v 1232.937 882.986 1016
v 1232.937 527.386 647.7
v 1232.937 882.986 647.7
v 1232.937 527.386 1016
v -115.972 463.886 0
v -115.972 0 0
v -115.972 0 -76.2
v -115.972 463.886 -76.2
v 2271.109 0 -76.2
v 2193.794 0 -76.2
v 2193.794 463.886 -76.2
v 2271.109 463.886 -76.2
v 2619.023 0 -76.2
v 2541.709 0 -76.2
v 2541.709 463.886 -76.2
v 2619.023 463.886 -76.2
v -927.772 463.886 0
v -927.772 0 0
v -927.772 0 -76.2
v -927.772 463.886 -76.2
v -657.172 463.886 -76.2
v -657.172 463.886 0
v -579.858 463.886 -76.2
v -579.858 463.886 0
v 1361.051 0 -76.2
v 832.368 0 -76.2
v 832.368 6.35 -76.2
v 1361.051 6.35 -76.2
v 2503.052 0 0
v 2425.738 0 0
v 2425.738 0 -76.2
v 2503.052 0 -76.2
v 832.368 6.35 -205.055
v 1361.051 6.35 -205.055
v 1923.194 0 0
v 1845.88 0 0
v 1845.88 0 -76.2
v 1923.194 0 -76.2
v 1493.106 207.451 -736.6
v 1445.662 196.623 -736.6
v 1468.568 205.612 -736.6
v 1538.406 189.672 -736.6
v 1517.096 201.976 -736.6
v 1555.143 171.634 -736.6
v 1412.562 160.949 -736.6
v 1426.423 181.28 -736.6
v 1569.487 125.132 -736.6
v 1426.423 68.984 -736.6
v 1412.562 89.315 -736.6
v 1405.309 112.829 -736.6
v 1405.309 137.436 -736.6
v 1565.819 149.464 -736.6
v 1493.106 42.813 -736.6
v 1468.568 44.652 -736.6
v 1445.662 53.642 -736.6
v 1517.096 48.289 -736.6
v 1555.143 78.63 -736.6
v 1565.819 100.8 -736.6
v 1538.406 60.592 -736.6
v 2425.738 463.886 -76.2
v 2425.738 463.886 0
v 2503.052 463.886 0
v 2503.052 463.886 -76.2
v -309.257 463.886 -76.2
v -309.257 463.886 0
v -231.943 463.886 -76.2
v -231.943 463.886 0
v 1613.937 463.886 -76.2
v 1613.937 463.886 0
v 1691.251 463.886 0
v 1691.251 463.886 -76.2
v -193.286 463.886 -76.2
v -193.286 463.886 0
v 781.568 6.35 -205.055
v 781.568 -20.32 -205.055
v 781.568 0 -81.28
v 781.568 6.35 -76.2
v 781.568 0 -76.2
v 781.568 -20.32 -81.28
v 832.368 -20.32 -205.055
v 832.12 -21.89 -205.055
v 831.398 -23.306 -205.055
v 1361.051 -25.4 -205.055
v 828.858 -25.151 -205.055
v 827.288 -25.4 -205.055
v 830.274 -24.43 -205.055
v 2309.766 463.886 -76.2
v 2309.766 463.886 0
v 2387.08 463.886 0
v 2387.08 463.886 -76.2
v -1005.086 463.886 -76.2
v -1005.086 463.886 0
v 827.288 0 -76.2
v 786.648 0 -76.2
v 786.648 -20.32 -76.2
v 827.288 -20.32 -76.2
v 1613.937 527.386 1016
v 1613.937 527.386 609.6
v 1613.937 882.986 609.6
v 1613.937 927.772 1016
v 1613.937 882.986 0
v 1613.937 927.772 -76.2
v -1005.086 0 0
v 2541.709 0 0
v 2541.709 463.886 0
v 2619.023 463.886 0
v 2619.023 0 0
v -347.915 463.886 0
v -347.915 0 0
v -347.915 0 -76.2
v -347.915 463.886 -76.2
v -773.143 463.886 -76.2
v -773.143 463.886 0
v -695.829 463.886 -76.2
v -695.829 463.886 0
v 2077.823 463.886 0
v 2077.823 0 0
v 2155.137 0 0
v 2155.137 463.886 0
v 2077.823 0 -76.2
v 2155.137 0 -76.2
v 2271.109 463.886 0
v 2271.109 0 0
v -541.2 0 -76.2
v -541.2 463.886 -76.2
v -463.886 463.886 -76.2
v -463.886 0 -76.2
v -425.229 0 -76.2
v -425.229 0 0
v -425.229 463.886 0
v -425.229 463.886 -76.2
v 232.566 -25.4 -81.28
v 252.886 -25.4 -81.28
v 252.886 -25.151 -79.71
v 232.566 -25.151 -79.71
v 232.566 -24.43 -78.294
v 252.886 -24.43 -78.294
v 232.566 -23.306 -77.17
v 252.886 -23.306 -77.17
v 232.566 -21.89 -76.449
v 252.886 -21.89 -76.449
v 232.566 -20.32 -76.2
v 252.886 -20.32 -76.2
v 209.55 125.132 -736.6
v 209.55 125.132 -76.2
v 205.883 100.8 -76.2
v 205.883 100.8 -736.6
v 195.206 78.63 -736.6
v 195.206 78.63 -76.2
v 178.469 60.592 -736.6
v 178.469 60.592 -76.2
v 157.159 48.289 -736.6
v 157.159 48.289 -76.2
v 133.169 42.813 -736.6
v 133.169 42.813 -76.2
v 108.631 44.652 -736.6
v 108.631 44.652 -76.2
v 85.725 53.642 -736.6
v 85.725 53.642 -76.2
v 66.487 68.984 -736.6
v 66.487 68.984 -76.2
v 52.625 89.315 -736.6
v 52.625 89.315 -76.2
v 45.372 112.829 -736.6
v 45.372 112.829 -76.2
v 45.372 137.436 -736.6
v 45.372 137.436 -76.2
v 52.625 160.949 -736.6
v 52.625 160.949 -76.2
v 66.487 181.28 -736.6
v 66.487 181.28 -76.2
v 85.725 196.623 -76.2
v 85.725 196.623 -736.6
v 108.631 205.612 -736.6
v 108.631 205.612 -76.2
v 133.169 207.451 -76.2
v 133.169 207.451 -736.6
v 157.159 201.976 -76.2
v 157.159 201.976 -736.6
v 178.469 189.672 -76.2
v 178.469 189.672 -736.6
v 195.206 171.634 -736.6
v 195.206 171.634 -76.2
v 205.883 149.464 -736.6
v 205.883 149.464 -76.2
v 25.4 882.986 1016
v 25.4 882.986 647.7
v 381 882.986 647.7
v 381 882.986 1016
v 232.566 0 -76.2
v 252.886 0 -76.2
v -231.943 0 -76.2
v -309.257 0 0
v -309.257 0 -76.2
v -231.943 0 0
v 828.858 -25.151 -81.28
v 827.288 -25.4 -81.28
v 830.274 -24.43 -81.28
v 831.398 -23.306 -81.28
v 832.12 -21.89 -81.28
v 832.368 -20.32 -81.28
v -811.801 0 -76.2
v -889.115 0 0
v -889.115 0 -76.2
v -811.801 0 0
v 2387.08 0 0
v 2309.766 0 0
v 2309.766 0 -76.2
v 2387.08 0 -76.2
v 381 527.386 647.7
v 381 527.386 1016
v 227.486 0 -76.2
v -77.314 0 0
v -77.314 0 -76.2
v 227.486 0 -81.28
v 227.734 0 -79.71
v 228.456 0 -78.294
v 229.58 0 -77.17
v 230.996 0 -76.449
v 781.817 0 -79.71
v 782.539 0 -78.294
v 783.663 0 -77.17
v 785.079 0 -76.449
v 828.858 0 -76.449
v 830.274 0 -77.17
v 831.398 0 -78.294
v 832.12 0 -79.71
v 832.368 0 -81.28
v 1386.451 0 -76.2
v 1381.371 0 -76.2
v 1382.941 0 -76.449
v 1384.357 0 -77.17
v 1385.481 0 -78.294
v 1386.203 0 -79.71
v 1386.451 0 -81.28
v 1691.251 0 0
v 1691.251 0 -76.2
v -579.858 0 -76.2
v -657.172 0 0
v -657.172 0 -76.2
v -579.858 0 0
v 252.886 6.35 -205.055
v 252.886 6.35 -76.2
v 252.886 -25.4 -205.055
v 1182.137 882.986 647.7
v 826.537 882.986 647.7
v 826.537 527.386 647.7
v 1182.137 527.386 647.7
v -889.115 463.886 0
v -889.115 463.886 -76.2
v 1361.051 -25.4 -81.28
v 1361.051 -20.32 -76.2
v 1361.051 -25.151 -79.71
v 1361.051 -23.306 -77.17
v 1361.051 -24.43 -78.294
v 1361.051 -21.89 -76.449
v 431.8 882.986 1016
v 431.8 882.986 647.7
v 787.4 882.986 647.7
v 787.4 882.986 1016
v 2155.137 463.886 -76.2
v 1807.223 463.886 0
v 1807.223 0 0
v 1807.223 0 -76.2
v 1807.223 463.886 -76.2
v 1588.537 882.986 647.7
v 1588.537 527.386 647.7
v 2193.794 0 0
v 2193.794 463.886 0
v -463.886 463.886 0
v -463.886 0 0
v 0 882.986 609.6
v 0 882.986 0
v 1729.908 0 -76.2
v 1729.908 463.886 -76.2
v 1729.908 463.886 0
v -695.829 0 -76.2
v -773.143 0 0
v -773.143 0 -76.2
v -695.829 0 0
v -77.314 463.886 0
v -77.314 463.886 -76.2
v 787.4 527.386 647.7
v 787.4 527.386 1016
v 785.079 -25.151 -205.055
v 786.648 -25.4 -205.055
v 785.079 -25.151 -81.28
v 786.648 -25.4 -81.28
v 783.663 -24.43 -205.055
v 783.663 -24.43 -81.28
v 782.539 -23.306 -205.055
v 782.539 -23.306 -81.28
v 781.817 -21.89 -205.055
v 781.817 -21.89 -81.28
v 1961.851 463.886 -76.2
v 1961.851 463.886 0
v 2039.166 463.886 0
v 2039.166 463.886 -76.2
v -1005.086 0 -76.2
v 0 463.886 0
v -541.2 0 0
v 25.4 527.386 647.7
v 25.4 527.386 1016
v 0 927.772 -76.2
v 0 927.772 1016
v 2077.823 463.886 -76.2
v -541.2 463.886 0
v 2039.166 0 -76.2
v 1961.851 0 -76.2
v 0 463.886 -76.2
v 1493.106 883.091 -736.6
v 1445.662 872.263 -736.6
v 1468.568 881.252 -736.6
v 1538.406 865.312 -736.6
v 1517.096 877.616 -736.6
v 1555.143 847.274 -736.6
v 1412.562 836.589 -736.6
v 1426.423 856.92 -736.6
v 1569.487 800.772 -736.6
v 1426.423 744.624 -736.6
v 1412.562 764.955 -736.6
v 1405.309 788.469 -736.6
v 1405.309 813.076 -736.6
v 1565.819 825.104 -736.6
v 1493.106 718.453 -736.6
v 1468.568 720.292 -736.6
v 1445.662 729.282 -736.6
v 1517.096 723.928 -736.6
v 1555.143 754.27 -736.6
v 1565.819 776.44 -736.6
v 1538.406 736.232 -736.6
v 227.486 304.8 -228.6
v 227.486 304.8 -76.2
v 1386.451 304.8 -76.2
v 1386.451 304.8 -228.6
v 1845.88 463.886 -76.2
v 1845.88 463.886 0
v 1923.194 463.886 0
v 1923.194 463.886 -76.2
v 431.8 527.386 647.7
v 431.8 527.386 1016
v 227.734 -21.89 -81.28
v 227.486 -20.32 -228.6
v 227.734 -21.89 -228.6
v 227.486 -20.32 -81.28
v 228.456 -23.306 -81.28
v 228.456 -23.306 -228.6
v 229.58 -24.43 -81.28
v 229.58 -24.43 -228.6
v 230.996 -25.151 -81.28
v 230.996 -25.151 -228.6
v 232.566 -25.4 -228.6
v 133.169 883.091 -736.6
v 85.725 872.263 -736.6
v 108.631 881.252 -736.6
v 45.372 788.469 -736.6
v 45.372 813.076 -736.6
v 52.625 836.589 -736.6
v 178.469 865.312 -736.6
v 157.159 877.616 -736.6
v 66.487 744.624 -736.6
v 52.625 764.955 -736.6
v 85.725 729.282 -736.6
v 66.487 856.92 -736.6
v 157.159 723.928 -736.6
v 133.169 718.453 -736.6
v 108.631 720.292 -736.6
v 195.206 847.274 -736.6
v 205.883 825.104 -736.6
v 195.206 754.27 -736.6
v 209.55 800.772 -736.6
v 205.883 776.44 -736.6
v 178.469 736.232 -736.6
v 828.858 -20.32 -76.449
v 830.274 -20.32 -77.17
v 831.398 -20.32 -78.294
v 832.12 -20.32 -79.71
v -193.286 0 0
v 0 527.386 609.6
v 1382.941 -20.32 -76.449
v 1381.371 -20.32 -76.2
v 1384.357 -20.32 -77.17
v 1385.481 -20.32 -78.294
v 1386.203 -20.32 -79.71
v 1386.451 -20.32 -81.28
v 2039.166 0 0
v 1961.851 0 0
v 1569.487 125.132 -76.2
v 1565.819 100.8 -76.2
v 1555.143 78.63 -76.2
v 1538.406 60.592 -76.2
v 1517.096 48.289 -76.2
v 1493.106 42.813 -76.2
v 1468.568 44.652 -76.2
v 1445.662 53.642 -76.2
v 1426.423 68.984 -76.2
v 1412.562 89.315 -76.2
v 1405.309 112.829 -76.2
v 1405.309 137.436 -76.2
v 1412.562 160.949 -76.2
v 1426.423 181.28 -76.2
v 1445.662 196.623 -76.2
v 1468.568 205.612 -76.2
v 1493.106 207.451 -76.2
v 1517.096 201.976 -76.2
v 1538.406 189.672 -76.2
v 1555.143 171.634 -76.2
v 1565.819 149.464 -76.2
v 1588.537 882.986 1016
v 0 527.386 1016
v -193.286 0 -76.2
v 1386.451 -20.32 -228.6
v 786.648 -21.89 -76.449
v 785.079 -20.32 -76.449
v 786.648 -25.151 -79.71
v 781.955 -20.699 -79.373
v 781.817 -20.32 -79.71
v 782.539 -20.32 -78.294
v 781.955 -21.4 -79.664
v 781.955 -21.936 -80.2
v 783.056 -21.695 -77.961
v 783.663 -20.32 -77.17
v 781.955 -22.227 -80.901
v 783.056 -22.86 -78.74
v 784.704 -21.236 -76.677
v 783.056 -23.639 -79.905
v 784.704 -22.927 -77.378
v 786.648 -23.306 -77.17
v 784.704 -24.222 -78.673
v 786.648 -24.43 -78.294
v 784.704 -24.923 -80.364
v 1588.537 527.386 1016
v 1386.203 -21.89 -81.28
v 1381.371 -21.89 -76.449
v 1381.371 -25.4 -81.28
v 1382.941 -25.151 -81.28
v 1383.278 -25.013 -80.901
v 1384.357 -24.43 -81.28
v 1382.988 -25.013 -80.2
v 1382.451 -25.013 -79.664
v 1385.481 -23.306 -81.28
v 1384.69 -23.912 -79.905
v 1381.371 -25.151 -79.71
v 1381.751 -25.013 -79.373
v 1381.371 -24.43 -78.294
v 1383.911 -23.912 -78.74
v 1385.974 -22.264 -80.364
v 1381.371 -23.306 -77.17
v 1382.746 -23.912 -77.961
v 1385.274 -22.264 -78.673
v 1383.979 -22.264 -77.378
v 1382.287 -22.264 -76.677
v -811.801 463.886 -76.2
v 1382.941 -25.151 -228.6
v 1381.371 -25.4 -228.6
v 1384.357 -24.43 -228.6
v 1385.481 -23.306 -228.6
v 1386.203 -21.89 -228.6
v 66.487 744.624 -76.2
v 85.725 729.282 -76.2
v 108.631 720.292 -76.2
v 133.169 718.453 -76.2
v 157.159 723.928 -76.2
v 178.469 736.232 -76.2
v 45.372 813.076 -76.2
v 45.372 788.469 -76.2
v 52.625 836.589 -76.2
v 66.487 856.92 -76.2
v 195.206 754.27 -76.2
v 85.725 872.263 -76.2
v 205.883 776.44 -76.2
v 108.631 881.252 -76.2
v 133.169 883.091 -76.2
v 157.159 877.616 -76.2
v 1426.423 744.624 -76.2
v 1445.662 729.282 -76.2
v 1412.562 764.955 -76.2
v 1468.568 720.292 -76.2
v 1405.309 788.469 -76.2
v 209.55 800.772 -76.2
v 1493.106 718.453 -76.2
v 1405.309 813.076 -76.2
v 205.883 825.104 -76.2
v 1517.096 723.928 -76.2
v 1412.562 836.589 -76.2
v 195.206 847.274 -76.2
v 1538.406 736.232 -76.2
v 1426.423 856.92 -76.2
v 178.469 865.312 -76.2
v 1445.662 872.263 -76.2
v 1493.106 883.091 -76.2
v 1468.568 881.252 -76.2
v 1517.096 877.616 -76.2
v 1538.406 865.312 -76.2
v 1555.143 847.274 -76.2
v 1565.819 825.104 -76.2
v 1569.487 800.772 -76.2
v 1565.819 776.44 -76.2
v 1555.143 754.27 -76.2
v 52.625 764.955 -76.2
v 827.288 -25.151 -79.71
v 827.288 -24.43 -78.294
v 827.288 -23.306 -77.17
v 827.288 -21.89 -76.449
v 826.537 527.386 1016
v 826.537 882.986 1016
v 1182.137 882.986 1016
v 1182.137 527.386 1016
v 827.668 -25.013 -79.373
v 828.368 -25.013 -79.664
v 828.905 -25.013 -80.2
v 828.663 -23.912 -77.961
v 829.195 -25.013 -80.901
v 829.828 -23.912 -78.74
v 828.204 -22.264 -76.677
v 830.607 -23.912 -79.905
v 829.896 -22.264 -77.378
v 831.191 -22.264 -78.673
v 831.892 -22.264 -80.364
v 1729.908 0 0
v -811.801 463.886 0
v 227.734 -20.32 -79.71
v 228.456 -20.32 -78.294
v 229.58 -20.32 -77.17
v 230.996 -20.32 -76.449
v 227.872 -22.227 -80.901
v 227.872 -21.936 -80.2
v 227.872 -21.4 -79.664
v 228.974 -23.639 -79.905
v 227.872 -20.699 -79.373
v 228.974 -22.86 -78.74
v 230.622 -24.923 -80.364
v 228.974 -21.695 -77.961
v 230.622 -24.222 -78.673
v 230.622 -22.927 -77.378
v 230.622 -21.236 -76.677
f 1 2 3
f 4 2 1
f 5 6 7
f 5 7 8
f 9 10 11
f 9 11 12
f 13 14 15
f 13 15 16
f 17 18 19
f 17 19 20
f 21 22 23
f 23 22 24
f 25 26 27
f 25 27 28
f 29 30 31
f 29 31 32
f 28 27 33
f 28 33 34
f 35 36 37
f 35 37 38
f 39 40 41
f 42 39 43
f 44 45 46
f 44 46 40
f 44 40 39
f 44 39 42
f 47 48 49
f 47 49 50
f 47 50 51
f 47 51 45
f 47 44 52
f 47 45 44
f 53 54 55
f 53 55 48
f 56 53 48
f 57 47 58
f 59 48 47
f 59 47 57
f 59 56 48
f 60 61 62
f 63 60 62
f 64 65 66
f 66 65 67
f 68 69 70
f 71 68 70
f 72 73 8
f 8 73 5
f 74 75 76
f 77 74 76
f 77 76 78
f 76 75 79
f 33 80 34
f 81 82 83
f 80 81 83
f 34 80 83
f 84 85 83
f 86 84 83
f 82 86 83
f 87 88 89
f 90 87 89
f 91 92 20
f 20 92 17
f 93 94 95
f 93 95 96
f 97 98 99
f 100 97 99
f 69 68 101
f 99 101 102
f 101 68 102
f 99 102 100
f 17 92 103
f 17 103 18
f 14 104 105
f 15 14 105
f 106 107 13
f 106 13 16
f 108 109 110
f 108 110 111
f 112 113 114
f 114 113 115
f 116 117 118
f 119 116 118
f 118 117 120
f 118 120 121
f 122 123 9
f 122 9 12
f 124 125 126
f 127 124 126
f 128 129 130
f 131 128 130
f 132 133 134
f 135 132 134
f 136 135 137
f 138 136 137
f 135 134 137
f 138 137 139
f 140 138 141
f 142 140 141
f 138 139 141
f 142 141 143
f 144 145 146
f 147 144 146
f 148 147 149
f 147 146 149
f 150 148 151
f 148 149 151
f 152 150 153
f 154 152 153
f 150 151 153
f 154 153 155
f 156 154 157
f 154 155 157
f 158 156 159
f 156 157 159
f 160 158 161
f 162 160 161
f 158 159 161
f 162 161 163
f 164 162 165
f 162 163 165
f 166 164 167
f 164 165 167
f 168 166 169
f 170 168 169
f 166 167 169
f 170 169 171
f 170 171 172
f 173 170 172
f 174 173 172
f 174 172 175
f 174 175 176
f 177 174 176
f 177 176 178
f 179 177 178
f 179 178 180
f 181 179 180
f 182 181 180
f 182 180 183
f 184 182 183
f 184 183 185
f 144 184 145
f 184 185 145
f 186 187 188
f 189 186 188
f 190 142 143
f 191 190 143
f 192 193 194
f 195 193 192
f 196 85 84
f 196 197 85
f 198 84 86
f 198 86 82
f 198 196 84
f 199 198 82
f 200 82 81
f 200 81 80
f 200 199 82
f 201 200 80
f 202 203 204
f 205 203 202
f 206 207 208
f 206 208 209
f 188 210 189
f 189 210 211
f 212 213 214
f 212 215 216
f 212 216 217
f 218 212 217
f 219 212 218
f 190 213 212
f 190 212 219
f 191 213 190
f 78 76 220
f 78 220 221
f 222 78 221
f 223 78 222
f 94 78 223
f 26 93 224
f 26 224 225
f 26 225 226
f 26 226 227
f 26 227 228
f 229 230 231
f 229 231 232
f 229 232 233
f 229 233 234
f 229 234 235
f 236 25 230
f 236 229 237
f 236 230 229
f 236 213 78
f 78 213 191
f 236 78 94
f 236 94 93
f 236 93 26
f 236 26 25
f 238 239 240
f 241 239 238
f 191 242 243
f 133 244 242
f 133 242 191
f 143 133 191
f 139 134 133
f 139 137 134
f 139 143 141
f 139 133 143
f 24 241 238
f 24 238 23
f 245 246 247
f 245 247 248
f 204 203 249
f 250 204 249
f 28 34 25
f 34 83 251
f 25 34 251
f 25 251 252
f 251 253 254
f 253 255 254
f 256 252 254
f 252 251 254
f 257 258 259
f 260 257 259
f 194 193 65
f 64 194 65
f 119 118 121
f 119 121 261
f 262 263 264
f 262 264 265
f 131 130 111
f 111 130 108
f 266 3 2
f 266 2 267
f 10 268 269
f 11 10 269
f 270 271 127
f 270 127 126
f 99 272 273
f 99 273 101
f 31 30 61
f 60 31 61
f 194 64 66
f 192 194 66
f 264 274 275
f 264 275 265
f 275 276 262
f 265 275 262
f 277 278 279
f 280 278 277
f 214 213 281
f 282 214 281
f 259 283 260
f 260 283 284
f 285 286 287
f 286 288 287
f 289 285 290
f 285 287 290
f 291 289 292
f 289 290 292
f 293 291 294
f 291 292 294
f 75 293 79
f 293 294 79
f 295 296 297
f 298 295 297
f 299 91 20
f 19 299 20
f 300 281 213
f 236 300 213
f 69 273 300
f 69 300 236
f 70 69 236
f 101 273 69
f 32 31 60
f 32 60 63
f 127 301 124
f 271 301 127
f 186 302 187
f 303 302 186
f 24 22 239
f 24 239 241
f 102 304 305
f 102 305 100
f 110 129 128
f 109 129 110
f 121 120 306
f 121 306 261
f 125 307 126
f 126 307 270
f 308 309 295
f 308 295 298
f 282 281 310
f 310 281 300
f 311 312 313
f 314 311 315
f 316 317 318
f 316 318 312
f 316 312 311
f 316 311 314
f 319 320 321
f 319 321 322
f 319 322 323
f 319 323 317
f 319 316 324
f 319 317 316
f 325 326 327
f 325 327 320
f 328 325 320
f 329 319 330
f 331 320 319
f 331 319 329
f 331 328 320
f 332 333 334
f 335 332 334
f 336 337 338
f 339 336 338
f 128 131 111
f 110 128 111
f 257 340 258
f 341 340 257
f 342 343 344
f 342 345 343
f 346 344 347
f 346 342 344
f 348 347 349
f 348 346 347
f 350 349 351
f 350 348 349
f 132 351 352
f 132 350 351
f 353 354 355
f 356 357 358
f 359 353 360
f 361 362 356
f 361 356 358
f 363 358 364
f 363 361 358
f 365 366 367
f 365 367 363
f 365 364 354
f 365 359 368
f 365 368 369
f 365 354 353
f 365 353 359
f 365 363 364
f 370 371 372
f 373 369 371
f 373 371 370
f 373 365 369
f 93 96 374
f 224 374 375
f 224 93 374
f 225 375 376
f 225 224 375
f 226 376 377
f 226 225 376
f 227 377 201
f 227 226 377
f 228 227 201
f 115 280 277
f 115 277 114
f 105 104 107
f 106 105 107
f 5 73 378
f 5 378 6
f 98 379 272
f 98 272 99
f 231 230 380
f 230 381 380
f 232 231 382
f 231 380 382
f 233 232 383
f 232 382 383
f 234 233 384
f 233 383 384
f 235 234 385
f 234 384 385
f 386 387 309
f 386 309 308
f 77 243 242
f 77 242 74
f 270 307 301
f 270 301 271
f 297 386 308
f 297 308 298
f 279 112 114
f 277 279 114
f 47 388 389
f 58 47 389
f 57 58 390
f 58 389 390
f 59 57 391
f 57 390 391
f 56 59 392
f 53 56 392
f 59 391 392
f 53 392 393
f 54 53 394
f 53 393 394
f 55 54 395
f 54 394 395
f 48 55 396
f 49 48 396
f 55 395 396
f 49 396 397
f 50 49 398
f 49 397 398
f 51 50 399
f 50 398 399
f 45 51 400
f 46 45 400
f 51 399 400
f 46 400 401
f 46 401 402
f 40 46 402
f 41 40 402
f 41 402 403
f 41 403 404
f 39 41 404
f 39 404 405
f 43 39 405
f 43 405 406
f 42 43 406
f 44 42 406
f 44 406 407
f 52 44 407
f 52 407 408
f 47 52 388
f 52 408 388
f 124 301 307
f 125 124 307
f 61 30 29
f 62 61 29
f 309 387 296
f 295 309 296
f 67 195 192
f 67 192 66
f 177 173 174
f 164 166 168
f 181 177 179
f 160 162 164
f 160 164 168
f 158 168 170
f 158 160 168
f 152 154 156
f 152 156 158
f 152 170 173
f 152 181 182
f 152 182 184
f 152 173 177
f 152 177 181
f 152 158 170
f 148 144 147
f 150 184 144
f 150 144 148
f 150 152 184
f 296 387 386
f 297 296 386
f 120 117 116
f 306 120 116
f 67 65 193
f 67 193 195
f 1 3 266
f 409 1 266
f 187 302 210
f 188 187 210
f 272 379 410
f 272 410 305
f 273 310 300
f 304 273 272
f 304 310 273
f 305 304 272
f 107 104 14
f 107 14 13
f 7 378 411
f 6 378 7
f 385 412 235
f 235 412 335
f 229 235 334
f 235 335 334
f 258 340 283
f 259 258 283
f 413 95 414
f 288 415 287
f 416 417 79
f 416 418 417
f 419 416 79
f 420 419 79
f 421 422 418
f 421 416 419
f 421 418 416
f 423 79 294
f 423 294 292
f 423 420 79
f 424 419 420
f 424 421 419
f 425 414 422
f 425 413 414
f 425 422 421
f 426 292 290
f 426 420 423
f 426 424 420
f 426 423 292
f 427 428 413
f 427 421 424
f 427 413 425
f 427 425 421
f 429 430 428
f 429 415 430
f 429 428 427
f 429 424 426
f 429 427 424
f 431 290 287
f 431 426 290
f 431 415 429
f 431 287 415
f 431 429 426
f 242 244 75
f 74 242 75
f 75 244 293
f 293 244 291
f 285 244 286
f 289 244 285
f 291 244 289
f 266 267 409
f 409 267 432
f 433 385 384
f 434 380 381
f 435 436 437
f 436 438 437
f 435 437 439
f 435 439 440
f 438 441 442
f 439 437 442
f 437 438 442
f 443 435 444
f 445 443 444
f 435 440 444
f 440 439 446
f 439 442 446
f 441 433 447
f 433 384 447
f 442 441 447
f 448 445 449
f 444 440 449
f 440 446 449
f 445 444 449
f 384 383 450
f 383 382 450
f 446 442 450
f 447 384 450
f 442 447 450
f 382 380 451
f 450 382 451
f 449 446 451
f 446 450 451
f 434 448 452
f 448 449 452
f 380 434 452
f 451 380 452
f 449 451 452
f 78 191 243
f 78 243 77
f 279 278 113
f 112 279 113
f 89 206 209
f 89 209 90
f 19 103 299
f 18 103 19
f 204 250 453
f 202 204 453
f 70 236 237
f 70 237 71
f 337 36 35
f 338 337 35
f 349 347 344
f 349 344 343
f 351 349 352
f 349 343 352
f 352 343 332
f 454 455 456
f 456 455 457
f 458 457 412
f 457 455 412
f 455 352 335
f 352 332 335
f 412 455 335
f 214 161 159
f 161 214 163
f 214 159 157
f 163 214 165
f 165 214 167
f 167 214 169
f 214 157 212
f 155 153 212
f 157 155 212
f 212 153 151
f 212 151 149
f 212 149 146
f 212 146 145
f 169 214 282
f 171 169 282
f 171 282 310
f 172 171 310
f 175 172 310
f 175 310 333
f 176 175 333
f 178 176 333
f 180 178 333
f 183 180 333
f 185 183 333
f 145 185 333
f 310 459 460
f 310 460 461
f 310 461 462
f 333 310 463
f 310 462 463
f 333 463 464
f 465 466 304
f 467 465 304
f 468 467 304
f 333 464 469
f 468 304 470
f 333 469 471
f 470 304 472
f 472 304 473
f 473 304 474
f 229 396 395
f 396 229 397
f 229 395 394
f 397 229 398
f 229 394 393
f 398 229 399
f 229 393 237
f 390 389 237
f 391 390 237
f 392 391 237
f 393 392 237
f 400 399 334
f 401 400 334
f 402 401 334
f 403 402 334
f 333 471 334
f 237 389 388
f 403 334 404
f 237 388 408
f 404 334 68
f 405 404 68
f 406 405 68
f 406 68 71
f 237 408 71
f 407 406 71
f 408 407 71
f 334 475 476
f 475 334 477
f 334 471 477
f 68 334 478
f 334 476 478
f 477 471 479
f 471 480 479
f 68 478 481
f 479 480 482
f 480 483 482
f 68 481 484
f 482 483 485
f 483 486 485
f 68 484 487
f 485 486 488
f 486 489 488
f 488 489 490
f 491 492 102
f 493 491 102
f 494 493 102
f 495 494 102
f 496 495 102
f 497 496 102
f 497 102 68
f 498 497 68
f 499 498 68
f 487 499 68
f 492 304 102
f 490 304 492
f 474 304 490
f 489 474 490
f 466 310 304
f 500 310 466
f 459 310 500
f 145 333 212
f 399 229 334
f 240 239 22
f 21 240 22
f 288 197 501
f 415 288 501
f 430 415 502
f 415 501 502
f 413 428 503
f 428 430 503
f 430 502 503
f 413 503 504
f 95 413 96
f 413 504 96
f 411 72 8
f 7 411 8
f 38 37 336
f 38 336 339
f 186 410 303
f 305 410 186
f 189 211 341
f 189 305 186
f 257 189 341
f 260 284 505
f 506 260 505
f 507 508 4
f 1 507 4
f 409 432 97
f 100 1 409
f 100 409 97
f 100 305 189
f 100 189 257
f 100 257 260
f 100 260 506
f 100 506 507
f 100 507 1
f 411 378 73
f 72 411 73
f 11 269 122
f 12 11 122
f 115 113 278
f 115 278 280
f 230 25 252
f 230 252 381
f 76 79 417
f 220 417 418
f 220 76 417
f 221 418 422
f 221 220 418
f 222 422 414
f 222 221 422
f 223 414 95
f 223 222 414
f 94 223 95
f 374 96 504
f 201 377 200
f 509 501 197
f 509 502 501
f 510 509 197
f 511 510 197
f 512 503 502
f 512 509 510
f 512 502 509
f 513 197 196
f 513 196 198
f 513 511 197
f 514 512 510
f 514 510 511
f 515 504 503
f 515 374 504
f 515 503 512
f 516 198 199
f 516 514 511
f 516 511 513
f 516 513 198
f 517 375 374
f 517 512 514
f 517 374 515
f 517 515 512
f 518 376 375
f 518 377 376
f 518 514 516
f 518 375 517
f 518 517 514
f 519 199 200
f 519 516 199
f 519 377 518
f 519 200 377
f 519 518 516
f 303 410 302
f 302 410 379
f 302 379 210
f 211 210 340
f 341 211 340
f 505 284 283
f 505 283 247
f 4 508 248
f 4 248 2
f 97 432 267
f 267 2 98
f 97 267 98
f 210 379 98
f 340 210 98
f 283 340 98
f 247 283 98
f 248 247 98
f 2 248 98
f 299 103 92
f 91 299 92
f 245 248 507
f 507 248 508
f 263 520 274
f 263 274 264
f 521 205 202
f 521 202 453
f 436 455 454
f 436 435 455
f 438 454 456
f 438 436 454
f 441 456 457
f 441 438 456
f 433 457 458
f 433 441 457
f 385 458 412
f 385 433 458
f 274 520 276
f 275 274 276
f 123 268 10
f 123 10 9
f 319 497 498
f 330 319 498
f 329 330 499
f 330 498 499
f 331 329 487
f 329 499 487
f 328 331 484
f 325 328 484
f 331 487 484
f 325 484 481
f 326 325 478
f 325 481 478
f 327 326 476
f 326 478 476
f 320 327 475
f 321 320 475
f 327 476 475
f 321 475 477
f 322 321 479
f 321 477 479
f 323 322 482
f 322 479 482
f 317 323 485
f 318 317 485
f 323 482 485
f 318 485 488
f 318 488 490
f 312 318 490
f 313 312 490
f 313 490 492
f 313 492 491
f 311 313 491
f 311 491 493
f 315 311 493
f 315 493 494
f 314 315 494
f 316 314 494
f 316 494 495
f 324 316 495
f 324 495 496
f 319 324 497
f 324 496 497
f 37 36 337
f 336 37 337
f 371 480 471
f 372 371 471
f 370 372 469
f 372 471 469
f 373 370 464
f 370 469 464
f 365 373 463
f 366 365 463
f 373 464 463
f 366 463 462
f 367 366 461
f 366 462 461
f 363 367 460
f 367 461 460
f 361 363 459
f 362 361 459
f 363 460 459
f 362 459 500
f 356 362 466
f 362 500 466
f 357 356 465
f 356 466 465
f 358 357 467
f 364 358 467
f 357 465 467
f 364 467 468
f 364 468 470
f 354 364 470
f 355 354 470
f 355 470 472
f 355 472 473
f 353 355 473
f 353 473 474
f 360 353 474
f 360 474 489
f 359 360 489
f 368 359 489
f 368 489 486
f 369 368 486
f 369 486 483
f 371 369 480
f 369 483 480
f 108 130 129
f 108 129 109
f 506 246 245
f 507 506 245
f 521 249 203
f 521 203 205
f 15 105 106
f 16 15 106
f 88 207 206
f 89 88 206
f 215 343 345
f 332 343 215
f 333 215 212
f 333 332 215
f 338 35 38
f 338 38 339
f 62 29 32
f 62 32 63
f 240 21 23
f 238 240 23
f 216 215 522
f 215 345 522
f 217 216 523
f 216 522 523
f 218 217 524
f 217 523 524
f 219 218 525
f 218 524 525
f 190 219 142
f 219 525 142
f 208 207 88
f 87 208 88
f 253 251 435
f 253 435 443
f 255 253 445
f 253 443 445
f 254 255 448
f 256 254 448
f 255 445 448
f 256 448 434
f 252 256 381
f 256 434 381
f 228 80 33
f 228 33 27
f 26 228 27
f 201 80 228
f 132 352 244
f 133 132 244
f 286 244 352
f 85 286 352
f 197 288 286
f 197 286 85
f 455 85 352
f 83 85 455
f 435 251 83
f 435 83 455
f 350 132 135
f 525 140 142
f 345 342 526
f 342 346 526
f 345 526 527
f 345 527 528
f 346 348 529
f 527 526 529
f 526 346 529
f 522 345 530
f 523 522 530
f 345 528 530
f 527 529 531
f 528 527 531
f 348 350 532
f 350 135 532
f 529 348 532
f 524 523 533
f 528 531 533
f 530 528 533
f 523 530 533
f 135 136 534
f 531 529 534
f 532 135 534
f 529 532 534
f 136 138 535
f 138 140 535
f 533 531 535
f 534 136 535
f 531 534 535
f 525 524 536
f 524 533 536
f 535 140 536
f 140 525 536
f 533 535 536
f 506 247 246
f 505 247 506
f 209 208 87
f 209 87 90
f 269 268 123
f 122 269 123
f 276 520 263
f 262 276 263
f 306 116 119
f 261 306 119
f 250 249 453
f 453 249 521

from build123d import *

# Parameters (mm, degrees)
F0_W           = 77.3143488
F0_H           = 463.8860572777
F0_W_2         = 77.3143428796
F1_DEPTH       = 76.2
F2_W           = 1613.9369076119
F2_H           = 400.3860572777
F3_DEPTH       = 1016
F4_R           = 82.55
F5_DEPTH       = 660.4
F6_W           = 1613.9369076119
F6_H           = 609.6
F7_DEPTH       = 355.6
F8_W           = 355.6
F8_H           = 368.3
F9_DEPTH       = 355.6
F10_W          = 1158.9655992915
F10_H          = 152.4
F11_DEPTH      = 304.8
F11_DEPTH_BACK = 25.4
F12_W          = 528.6827996458
F12_H          = 128.8552815199
F13_DEPTH      = 31.75
F14_R          = 5.08


# Not quite as in the source:
# - two fillets or chamfers of one size are made in one step


with BuildPart() as f1:
    # F0 (on Top) → F1 (new body)
    with BuildSketch(Plane.XY):
        Polygon((0, 463.8860572777), (0, 0), (1613.9369076119, 0), (1613.9369076119, 463.8860572777), (1613.9369076119, 927.7721145553), (0, 927.7721145553), align=None)
        with Locations((-38.6571744, 231.9430286388)):
            Rectangle(F0_W, F0_H)
        with Locations((1652.5940790517, 231.9430286388)):
            Rectangle(F0_W_2, F0_H)
    extrude(amount=-F1_DEPTH)

    # F2 (on face) → F3 (join)
    with BuildSketch(Plane.XY):
        with Locations((806.968453806, 727.5790859165)):
            Rectangle(F2_W, F2_H)
    extrude(amount=F3_DEPTH)

    # F4 (on face) → F5 (join)
    with BuildSketch(Plane(origin=(0, 0, -76.2), x_dir=(1, 0, 0), z_dir=(0, 0, -1))):
        with Locations((127, -800.7721145553)):
            Circle(F4_R)
        with Locations((1486.9369076119, -800.7721145553)):
            Circle(F4_R)
        with Locations((127, -125.1321285963)):
            Circle(F4_R)
        with Locations((1486.9369016915, -125.1321285963)):
            Circle(F4_R)
    extrude(amount=F5_DEPTH)

    # F6 (on face) → F7 (cut)
    with BuildSketch(Plane.XZ.offset(-527.3860572777)):
        with Locations((806.968453806, 304.8)):
            Rectangle(F6_W, F6_H)
    extrude(amount=-F7_DEPTH, mode=Mode.SUBTRACT)

    # F8 (on face) → F9 (cut)
    with BuildSketch(Plane.XZ.offset(-527.3860572777)):
        with Locations((203.2, 831.85)):
            Rectangle(F8_W, F8_H)
        with Locations((609.6, 831.85)):
            Rectangle(F8_W, F8_H)
        with Locations((1004.3369076119, 831.85)):
            Rectangle(F8_W, F8_H)
        with Locations((1410.7369076119, 831.85)):
            Rectangle(F8_W, F8_H)
    extrude(amount=-F9_DEPTH, mode=Mode.SUBTRACT)

    # F10 (on face) → F11 (join, two sides)
    with BuildSketch(Plane.XZ) as f11_sk:
        with Locations((806.9684508458, -152.4)):
            Rectangle(F10_W, F10_H)
    extrude(amount=-F11_DEPTH)
    extrude(f11_sk.sketch, amount=F11_DEPTH_BACK)

    # F12 (on face) → F13 (cut)
    with BuildSketch(Plane.XZ.offset(25.4)):
        with Locations((517.2270510229, -140.6276407599)):
            Rectangle(F12_W, F12_H)
        with Locations((1096.7098506686, -140.6276407599)):
            Rectangle(F12_W, F12_H)
    extrude(amount=-F13_DEPTH, mode=Mode.SUBTRACT)

    # F14
    f14_edges = [f1.edges().sort_by_distance(p)[0] for p in [
        (240.185651, -25.4, -76.2),
        (227.485651, -25.4, -152.4),
        (1386.45125, -12.7, -76.2),
        (1386.45125, -25.4, -152.4),
        (227.485651, -12.7, -76.2),
        (832.368451, -12.7, -76.2),
        (806.968451, -25.4, -76.2),
        (781.568451, -12.7, -76.2),
        (1373.75125, -25.4, -76.2),
        (781.568451, -25.4, -140.627641),
        (832.368451, -25.4, -140.627641),
    ]]
    fillet(f14_edges, radius=F14_R)


with BuildPart() as f1b:
    # F0 (on Top) → F1, piece 2 (new body)
    with BuildSketch(Plane.XY):
        with Locations((1768.5655933711, 231.9430286388)):
            Rectangle(F0_W_2, F0_H)
    extrude(amount=-F1_DEPTH)


with BuildPart() as f1c:
    # F0 (on Top) → F1, piece 3 (new body)
    with BuildSketch(Plane.XY):
        with Locations((1884.5371076906, 231.9430286388)):
            Rectangle(F0_W_2, F0_H)
    extrude(amount=-F1_DEPTH)


with BuildPart() as f1d:
    # F0 (on Top) → F1, piece 4 (new body)
    with BuildSketch(Plane.XY):
        with Locations((2000.50862201, 231.9430286388)):
            Rectangle(F0_W_2, F0_H)
    extrude(amount=-F1_DEPTH)


with BuildPart() as f1e:
    # F0 (on Top) → F1, piece 5 (new body)
    with BuildSketch(Plane.XY):
        with Locations((2116.4801363294, 231.9430286388)):
            Rectangle(F0_W_2, F0_H)
    extrude(amount=-F1_DEPTH)


with BuildPart() as f1f:
    # F0 (on Top) → F1, piece 6 (new body)
    with BuildSketch(Plane.XY):
        with Locations((2232.4516506488, 231.9430286388)):
            Rectangle(F0_W_2, F0_H)
    extrude(amount=-F1_DEPTH)


with BuildPart() as f1g:
    # F0 (on Top) → F1, piece 7 (new body)
    with BuildSketch(Plane.XY):
        with Locations((2348.4231649682, 231.9430286388)):
            Rectangle(F0_W_2, F0_H)
    extrude(amount=-F1_DEPTH)


with BuildPart() as f1h:
    # F0 (on Top) → F1, piece 8 (new body)
    with BuildSketch(Plane.XY):
        with Locations((2464.3946792876, 231.9430286388)):
            Rectangle(F0_W_2, F0_H)
    extrude(amount=-F1_DEPTH)


with BuildPart() as f1i:
    # F0 (on Top) → F1, piece 9 (new body)
    with BuildSketch(Plane.XY):
        with Locations((2580.3661936071, 231.9430286388)):
            Rectangle(F0_W_2, F0_H)
    extrude(amount=-F1_DEPTH)


with BuildPart() as f1j:
    # F0 (on Top) → F1, piece 10 (new body)
    with BuildSketch(Plane.XY):
        with Locations((-966.4292948757, 231.9430286388)):
            Rectangle(F0_W_2, F0_H)
    extrude(amount=-F1_DEPTH)


with BuildPart() as f1k:
    # F0 (on Top) → F1, piece 11 (new body)
    with BuildSketch(Plane.XY):
        with Locations((-850.4577805563, 231.9430286388)):
            Rectangle(F0_W_2, F0_H)
    extrude(amount=-F1_DEPTH)


with BuildPart() as f1l:
    # F0 (on Top) → F1, piece 12 (new body)
    with BuildSketch(Plane.XY):
        with Locations((-734.4862662369, 231.9430286388)):
            Rectangle(F0_W_2, F0_H)
    extrude(amount=-F1_DEPTH)


with BuildPart() as f1m:
    # F0 (on Top) → F1, piece 13 (new body)
    with BuildSketch(Plane.XY):
        with Locations((-618.5147519175, 231.9430286388)):
            Rectangle(F0_W_2, F0_H)
    extrude(amount=-F1_DEPTH)


with BuildPart() as f1n:
    # F0 (on Top) → F1, piece 14 (new body)
    with BuildSketch(Plane.XY):
        with Locations((-502.5432375981, 231.9430286388)):
            Rectangle(F0_W_2, F0_H)
    extrude(amount=-F1_DEPTH)


with BuildPart() as f1o:
    # F0 (on Top) → F1, piece 15 (new body)
    with BuildSketch(Plane.XY):
        with Locations((-386.5717232786, 231.9430286388)):
            Rectangle(F0_W_2, F0_H)
    extrude(amount=-F1_DEPTH)


with BuildPart() as f1p:
    # F0 (on Top) → F1, piece 16 (new body)
    with BuildSketch(Plane.XY):
        with Locations((-270.6002089592, 231.9430286388)):
            Rectangle(F0_W_2, F0_H)
    extrude(amount=-F1_DEPTH)


with BuildPart() as f1q:
    # F0 (on Top) → F1, piece 17 (new body)
    with BuildSketch(Plane.XY):
        with Locations((-154.6286946398, 231.9430286388)):
            Rectangle(F0_W_2, F0_H)
    extrude(amount=-F1_DEPTH)


solid = Compound([f1.part, f1b.part, f1c.part, f1d.part, f1e.part, f1f.part, f1g.part, f1h.part, f1i.part, f1j.part, f1k.part, f1l.part, f1m.part, f1n.part, f1o.part, f1p.part, f1q.part])
